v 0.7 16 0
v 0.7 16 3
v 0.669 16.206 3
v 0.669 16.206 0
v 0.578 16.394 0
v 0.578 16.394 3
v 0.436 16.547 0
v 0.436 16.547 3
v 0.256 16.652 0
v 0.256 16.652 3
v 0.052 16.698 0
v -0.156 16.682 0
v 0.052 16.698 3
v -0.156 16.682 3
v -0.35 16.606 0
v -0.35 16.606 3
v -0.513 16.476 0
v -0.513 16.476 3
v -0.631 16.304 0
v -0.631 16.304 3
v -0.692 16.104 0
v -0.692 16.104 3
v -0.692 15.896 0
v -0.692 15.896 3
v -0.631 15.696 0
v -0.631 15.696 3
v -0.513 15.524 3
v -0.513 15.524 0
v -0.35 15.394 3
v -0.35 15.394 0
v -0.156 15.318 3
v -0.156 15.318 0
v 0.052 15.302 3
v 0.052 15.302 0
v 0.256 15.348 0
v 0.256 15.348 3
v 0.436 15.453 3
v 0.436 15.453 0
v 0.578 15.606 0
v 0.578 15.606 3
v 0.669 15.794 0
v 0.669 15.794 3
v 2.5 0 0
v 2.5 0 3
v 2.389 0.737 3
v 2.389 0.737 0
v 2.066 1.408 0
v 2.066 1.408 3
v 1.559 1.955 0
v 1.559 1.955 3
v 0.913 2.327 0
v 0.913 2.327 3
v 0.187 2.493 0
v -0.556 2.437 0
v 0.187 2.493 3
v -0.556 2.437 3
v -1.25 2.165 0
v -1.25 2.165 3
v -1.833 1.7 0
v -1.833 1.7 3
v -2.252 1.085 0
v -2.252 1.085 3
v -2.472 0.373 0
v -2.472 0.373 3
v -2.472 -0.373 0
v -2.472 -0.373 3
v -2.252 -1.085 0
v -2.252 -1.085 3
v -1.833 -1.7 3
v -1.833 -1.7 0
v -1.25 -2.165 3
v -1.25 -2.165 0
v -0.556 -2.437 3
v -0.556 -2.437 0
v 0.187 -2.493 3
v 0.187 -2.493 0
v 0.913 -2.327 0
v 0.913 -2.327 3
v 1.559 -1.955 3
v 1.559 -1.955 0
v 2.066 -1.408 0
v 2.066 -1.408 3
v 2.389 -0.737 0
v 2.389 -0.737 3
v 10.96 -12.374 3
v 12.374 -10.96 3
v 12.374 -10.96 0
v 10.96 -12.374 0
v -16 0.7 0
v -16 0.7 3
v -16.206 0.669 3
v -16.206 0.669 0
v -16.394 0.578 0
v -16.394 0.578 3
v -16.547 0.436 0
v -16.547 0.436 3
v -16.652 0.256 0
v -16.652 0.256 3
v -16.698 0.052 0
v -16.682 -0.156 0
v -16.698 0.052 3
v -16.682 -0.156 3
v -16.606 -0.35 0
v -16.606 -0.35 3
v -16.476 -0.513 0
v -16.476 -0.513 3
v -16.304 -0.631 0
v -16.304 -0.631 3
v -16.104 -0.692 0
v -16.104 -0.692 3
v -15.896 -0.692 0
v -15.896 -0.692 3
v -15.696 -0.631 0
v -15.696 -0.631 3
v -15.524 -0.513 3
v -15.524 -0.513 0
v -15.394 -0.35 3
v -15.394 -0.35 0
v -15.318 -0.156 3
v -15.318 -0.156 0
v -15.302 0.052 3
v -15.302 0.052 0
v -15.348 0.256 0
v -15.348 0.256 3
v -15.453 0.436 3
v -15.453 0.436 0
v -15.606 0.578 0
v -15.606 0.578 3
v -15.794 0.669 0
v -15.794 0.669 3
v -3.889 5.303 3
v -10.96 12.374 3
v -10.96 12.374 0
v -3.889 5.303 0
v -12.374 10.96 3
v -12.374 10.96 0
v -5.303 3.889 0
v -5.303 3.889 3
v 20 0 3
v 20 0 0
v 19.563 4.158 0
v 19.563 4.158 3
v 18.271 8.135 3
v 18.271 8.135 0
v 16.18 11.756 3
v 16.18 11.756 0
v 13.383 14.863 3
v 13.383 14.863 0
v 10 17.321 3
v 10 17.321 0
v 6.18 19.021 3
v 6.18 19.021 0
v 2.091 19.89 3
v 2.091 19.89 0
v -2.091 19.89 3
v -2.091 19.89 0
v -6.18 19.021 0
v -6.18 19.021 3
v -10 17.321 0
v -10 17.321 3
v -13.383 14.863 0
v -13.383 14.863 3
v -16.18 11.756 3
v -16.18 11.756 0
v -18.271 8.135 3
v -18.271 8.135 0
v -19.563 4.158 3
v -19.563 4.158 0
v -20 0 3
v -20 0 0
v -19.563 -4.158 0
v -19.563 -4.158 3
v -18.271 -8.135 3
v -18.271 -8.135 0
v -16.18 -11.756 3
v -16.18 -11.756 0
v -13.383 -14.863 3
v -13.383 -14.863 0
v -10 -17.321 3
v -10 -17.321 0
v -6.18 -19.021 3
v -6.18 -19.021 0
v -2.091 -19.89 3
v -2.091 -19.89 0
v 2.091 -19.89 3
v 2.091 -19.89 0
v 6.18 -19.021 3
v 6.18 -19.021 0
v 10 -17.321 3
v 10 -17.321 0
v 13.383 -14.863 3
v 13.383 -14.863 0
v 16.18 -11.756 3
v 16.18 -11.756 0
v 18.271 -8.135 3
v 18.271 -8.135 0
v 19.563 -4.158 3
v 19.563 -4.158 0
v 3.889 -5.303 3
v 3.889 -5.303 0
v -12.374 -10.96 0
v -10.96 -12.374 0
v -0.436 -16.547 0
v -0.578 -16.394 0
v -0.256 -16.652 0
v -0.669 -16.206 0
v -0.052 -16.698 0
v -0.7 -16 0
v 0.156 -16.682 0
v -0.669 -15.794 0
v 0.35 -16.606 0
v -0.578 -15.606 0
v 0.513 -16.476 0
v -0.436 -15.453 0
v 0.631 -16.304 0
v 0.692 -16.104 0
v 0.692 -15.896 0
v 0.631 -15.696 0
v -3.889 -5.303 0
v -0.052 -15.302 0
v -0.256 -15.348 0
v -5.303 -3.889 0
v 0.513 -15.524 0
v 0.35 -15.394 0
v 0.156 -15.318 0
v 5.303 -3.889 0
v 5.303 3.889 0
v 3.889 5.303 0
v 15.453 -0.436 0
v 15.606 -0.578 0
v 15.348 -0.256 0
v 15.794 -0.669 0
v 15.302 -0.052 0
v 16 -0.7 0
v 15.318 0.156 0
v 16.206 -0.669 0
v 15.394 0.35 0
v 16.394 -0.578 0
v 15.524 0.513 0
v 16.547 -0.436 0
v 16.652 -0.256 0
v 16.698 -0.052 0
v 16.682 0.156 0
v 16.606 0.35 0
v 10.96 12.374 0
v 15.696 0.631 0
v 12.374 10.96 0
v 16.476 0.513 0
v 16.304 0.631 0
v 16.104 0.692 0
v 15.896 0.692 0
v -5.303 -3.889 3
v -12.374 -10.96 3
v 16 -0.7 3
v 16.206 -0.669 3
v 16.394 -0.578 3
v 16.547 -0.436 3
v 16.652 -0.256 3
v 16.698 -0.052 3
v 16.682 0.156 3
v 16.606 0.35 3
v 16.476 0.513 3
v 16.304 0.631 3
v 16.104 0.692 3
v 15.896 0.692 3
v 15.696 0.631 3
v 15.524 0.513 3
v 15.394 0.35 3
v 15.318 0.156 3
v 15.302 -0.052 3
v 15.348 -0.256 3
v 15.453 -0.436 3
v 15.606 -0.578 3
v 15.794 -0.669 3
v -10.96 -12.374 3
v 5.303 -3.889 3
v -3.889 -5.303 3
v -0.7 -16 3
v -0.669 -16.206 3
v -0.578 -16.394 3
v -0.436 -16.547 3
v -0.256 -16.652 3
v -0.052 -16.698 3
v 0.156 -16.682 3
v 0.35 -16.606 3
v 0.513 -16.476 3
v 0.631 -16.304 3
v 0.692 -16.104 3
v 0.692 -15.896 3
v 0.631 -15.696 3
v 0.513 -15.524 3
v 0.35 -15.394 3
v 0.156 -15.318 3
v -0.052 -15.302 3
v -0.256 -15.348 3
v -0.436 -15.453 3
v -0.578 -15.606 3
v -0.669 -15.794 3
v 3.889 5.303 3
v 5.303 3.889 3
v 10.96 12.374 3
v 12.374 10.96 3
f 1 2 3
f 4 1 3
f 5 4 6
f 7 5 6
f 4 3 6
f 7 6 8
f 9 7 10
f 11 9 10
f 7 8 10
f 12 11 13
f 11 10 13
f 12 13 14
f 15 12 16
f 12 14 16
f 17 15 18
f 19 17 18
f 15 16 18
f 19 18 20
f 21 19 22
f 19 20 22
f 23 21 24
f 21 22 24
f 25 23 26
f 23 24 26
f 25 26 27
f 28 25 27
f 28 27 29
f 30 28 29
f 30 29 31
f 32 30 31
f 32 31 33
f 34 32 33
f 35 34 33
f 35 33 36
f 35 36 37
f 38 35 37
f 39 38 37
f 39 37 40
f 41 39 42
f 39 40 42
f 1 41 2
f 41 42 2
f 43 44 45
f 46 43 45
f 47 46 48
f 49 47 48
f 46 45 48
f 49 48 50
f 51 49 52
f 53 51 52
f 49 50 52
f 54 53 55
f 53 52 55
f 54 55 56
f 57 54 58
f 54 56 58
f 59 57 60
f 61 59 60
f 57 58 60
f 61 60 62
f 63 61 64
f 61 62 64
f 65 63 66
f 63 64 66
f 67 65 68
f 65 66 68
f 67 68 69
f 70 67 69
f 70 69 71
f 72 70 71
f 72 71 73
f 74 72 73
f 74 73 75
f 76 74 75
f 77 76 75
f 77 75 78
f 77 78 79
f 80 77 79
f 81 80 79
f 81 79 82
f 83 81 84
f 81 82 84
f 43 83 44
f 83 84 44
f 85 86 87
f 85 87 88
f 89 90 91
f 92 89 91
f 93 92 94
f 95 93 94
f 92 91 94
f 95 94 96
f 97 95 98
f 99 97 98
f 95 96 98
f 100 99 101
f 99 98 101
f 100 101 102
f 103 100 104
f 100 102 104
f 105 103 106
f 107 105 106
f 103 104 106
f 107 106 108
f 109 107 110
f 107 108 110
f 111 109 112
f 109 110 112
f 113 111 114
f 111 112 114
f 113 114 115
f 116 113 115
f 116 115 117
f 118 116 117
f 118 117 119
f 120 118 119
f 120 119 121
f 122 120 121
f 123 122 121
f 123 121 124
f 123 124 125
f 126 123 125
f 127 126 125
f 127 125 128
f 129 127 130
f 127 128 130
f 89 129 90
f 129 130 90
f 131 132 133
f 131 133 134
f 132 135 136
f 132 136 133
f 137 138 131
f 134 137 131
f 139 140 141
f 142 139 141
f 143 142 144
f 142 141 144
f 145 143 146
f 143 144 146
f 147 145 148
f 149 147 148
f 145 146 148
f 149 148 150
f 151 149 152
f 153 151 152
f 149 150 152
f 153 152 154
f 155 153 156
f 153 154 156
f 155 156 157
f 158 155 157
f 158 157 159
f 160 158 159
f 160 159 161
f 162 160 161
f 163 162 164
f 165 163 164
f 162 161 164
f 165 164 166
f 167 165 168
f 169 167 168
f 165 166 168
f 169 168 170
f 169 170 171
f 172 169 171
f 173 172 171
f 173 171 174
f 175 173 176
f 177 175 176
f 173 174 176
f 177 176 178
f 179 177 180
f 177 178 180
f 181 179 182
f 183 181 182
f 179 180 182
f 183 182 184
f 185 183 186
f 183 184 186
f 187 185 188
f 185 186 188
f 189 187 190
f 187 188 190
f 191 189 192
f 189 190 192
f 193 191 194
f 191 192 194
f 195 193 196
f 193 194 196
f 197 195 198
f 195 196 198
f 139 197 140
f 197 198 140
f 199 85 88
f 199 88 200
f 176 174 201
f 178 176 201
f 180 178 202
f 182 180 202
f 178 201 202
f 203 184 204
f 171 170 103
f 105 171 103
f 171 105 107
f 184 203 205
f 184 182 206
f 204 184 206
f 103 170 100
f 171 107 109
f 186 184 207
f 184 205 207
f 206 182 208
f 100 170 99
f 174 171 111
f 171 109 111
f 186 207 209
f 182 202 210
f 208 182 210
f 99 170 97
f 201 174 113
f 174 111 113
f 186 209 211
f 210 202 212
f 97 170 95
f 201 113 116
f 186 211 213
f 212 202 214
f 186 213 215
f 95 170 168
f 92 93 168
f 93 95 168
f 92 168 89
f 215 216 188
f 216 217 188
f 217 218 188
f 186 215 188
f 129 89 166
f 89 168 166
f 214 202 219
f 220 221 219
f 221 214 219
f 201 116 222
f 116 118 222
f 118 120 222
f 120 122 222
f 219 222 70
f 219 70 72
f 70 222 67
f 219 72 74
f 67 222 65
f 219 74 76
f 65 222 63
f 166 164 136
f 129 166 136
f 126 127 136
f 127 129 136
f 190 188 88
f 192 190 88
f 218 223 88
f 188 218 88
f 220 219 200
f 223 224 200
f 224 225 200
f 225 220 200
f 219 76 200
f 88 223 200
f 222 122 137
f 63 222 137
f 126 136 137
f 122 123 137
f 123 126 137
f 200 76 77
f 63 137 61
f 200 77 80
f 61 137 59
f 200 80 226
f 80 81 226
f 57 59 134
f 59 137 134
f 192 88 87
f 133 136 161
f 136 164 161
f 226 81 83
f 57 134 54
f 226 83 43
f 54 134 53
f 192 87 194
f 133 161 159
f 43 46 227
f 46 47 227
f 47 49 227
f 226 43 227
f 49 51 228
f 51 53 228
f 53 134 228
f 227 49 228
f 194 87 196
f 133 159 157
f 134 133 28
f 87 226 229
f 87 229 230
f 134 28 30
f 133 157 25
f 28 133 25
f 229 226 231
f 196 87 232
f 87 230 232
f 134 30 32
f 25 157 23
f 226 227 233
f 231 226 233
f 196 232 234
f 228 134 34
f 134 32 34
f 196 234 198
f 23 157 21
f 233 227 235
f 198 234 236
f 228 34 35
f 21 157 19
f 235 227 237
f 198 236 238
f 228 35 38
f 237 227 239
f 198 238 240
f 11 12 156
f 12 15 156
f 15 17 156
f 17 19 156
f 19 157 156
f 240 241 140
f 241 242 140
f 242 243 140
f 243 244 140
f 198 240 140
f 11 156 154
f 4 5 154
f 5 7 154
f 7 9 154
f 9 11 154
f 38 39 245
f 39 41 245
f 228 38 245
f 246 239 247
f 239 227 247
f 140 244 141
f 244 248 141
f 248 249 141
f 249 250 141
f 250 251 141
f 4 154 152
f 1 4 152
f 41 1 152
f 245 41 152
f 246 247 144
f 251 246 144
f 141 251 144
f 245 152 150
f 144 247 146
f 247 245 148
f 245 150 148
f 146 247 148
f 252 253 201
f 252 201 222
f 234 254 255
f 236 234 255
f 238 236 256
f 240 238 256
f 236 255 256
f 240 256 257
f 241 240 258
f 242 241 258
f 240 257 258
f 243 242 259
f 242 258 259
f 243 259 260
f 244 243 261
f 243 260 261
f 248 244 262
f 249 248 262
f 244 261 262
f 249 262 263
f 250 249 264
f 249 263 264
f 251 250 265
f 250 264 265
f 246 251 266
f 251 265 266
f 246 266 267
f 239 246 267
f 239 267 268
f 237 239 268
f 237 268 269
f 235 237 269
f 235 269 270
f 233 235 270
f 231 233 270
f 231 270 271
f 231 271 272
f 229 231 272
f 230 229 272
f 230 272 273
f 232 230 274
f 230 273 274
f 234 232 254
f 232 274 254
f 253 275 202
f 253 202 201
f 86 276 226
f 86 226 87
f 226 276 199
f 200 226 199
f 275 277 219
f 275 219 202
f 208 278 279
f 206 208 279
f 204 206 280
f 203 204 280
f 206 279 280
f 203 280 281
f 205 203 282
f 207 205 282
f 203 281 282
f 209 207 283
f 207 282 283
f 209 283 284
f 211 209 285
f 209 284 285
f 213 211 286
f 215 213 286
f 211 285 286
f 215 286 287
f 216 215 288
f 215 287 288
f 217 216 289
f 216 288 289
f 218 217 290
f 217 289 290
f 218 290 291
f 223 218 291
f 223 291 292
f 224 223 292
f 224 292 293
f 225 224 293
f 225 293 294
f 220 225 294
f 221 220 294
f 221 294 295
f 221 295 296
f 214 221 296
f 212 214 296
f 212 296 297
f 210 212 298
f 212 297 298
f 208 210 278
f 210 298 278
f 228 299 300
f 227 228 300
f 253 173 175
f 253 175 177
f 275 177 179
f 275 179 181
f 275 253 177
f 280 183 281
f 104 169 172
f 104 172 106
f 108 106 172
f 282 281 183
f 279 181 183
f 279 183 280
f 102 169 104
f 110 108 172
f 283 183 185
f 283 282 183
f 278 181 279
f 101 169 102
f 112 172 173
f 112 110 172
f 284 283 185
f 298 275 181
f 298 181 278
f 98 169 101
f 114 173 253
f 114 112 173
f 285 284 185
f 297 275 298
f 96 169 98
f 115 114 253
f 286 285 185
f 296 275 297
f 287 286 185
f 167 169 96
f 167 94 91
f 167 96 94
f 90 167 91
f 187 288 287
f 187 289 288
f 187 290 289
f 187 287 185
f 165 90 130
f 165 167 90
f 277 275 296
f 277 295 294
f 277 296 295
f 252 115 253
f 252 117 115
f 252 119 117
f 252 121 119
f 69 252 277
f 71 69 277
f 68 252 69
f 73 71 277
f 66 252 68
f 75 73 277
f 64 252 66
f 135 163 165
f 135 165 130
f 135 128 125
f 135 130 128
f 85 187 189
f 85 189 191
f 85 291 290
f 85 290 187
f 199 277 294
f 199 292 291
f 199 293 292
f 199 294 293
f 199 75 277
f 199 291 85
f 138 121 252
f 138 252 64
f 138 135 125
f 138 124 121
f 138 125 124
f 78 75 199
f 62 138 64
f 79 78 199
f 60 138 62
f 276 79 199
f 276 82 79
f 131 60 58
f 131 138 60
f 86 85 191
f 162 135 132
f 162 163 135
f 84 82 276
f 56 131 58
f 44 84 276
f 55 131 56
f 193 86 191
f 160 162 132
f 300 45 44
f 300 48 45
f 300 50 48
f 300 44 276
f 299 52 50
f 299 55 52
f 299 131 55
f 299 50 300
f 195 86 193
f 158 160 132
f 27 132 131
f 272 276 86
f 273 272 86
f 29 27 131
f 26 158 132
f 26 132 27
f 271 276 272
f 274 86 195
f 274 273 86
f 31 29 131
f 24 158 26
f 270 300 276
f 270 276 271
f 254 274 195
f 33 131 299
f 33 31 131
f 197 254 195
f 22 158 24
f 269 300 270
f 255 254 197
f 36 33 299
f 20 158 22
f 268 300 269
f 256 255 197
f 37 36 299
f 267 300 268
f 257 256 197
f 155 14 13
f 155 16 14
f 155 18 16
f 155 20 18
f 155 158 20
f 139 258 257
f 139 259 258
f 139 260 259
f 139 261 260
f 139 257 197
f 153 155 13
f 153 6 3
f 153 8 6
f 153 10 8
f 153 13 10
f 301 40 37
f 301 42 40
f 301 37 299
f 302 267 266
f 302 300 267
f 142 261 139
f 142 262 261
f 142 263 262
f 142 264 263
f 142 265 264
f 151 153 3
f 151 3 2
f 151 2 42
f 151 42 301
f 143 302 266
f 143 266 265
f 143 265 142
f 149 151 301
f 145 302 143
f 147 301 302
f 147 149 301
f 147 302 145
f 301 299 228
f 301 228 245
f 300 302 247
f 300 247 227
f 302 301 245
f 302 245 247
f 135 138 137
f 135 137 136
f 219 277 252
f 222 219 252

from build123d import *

# Parameters (mm, degrees)
SKETCH_1_R               = 20
EXTRUDE_1_DEPTH          = 3
SKETCH_2_R               = 0.7
CUT_EXTRUDE_1_DEPTH      = 3
PATTERN_CIRCULAR_2_COUNT = 4
SKETCH_4_R               = 2.5
CUT_EXTRUDE_3_DEPTH      = 3
CUT_EXTRUDE_4_DEPTH      = 3
PATTERN_CIRCULAR_4_COUNT = 4


with BuildPart() as part:
    # ｽｹｯﾁ1 → ﾎﾞｽ - 押し出し1 (new body)
    with BuildSketch(Plane.XY):
        Circle(SKETCH_1_R)
    extrude(amount=EXTRUDE_1_DEPTH)

    # ｽｹｯﾁ2 → ｶｯﾄ - 押し出し1 (cut)
    with BuildSketch(Plane.XY.offset(3)):
        with Locations((0, 16)):
            Circle(SKETCH_2_R)
    cut_extrude_1 = extrude(amount=-CUT_EXTRUDE_1_DEPTH, mode=Mode.SUBTRACT)

    # 円形ﾊﾟﾀｰﾝ2: ｶｯﾄ - 押し出し1 ×4 about axis
    pattern_circular_2_axis = Axis((0, 0, 0), (0, 0, 1))
    for i in range(1, PATTERN_CIRCULAR_2_COUNT):
        add(cut_extrude_1.rotate(pattern_circular_2_axis, i * 360 / PATTERN_CIRCULAR_2_COUNT), mode=Mode.SUBTRACT)

    # ｽｹｯﾁ4 → ｶｯﾄ - 押し出し3 (cut)
    with BuildSketch(Plane.XY.offset(3)):
        Circle(SKETCH_4_R)
    extrude(amount=-CUT_EXTRUDE_3_DEPTH, mode=Mode.SUBTRACT)

    # ｽｹｯﾁ5 → ｶｯﾄ - 押し出し4 (cut)
    with BuildSketch(Plane.XY.offset(3)):
        Polygon((4.596194078, 4.596194078), (3.889087297, 5.303300859), (10.960155108, 12.374368671), (12.374368671, 10.960155108), (5.303300859, 3.889087297), align=None)
    cut_extrude_4 = extrude(amount=-CUT_EXTRUDE_4_DEPTH, mode=Mode.SUBTRACT)

    # 円形ﾊﾟﾀｰﾝ4: ｶｯﾄ - 押し出し4 ×4 about axis
    pattern_circular_4_axis = Axis((0, 0, 0), (0, 0, 1))
    for i in range(1, PATTERN_CIRCULAR_4_COUNT):
        add(cut_extrude_4.rotate(pattern_circular_4_axis, i * 360 / PATTERN_CIRCULAR_4_COUNT), mode=Mode.SUBTRACT)


solid = part.part
